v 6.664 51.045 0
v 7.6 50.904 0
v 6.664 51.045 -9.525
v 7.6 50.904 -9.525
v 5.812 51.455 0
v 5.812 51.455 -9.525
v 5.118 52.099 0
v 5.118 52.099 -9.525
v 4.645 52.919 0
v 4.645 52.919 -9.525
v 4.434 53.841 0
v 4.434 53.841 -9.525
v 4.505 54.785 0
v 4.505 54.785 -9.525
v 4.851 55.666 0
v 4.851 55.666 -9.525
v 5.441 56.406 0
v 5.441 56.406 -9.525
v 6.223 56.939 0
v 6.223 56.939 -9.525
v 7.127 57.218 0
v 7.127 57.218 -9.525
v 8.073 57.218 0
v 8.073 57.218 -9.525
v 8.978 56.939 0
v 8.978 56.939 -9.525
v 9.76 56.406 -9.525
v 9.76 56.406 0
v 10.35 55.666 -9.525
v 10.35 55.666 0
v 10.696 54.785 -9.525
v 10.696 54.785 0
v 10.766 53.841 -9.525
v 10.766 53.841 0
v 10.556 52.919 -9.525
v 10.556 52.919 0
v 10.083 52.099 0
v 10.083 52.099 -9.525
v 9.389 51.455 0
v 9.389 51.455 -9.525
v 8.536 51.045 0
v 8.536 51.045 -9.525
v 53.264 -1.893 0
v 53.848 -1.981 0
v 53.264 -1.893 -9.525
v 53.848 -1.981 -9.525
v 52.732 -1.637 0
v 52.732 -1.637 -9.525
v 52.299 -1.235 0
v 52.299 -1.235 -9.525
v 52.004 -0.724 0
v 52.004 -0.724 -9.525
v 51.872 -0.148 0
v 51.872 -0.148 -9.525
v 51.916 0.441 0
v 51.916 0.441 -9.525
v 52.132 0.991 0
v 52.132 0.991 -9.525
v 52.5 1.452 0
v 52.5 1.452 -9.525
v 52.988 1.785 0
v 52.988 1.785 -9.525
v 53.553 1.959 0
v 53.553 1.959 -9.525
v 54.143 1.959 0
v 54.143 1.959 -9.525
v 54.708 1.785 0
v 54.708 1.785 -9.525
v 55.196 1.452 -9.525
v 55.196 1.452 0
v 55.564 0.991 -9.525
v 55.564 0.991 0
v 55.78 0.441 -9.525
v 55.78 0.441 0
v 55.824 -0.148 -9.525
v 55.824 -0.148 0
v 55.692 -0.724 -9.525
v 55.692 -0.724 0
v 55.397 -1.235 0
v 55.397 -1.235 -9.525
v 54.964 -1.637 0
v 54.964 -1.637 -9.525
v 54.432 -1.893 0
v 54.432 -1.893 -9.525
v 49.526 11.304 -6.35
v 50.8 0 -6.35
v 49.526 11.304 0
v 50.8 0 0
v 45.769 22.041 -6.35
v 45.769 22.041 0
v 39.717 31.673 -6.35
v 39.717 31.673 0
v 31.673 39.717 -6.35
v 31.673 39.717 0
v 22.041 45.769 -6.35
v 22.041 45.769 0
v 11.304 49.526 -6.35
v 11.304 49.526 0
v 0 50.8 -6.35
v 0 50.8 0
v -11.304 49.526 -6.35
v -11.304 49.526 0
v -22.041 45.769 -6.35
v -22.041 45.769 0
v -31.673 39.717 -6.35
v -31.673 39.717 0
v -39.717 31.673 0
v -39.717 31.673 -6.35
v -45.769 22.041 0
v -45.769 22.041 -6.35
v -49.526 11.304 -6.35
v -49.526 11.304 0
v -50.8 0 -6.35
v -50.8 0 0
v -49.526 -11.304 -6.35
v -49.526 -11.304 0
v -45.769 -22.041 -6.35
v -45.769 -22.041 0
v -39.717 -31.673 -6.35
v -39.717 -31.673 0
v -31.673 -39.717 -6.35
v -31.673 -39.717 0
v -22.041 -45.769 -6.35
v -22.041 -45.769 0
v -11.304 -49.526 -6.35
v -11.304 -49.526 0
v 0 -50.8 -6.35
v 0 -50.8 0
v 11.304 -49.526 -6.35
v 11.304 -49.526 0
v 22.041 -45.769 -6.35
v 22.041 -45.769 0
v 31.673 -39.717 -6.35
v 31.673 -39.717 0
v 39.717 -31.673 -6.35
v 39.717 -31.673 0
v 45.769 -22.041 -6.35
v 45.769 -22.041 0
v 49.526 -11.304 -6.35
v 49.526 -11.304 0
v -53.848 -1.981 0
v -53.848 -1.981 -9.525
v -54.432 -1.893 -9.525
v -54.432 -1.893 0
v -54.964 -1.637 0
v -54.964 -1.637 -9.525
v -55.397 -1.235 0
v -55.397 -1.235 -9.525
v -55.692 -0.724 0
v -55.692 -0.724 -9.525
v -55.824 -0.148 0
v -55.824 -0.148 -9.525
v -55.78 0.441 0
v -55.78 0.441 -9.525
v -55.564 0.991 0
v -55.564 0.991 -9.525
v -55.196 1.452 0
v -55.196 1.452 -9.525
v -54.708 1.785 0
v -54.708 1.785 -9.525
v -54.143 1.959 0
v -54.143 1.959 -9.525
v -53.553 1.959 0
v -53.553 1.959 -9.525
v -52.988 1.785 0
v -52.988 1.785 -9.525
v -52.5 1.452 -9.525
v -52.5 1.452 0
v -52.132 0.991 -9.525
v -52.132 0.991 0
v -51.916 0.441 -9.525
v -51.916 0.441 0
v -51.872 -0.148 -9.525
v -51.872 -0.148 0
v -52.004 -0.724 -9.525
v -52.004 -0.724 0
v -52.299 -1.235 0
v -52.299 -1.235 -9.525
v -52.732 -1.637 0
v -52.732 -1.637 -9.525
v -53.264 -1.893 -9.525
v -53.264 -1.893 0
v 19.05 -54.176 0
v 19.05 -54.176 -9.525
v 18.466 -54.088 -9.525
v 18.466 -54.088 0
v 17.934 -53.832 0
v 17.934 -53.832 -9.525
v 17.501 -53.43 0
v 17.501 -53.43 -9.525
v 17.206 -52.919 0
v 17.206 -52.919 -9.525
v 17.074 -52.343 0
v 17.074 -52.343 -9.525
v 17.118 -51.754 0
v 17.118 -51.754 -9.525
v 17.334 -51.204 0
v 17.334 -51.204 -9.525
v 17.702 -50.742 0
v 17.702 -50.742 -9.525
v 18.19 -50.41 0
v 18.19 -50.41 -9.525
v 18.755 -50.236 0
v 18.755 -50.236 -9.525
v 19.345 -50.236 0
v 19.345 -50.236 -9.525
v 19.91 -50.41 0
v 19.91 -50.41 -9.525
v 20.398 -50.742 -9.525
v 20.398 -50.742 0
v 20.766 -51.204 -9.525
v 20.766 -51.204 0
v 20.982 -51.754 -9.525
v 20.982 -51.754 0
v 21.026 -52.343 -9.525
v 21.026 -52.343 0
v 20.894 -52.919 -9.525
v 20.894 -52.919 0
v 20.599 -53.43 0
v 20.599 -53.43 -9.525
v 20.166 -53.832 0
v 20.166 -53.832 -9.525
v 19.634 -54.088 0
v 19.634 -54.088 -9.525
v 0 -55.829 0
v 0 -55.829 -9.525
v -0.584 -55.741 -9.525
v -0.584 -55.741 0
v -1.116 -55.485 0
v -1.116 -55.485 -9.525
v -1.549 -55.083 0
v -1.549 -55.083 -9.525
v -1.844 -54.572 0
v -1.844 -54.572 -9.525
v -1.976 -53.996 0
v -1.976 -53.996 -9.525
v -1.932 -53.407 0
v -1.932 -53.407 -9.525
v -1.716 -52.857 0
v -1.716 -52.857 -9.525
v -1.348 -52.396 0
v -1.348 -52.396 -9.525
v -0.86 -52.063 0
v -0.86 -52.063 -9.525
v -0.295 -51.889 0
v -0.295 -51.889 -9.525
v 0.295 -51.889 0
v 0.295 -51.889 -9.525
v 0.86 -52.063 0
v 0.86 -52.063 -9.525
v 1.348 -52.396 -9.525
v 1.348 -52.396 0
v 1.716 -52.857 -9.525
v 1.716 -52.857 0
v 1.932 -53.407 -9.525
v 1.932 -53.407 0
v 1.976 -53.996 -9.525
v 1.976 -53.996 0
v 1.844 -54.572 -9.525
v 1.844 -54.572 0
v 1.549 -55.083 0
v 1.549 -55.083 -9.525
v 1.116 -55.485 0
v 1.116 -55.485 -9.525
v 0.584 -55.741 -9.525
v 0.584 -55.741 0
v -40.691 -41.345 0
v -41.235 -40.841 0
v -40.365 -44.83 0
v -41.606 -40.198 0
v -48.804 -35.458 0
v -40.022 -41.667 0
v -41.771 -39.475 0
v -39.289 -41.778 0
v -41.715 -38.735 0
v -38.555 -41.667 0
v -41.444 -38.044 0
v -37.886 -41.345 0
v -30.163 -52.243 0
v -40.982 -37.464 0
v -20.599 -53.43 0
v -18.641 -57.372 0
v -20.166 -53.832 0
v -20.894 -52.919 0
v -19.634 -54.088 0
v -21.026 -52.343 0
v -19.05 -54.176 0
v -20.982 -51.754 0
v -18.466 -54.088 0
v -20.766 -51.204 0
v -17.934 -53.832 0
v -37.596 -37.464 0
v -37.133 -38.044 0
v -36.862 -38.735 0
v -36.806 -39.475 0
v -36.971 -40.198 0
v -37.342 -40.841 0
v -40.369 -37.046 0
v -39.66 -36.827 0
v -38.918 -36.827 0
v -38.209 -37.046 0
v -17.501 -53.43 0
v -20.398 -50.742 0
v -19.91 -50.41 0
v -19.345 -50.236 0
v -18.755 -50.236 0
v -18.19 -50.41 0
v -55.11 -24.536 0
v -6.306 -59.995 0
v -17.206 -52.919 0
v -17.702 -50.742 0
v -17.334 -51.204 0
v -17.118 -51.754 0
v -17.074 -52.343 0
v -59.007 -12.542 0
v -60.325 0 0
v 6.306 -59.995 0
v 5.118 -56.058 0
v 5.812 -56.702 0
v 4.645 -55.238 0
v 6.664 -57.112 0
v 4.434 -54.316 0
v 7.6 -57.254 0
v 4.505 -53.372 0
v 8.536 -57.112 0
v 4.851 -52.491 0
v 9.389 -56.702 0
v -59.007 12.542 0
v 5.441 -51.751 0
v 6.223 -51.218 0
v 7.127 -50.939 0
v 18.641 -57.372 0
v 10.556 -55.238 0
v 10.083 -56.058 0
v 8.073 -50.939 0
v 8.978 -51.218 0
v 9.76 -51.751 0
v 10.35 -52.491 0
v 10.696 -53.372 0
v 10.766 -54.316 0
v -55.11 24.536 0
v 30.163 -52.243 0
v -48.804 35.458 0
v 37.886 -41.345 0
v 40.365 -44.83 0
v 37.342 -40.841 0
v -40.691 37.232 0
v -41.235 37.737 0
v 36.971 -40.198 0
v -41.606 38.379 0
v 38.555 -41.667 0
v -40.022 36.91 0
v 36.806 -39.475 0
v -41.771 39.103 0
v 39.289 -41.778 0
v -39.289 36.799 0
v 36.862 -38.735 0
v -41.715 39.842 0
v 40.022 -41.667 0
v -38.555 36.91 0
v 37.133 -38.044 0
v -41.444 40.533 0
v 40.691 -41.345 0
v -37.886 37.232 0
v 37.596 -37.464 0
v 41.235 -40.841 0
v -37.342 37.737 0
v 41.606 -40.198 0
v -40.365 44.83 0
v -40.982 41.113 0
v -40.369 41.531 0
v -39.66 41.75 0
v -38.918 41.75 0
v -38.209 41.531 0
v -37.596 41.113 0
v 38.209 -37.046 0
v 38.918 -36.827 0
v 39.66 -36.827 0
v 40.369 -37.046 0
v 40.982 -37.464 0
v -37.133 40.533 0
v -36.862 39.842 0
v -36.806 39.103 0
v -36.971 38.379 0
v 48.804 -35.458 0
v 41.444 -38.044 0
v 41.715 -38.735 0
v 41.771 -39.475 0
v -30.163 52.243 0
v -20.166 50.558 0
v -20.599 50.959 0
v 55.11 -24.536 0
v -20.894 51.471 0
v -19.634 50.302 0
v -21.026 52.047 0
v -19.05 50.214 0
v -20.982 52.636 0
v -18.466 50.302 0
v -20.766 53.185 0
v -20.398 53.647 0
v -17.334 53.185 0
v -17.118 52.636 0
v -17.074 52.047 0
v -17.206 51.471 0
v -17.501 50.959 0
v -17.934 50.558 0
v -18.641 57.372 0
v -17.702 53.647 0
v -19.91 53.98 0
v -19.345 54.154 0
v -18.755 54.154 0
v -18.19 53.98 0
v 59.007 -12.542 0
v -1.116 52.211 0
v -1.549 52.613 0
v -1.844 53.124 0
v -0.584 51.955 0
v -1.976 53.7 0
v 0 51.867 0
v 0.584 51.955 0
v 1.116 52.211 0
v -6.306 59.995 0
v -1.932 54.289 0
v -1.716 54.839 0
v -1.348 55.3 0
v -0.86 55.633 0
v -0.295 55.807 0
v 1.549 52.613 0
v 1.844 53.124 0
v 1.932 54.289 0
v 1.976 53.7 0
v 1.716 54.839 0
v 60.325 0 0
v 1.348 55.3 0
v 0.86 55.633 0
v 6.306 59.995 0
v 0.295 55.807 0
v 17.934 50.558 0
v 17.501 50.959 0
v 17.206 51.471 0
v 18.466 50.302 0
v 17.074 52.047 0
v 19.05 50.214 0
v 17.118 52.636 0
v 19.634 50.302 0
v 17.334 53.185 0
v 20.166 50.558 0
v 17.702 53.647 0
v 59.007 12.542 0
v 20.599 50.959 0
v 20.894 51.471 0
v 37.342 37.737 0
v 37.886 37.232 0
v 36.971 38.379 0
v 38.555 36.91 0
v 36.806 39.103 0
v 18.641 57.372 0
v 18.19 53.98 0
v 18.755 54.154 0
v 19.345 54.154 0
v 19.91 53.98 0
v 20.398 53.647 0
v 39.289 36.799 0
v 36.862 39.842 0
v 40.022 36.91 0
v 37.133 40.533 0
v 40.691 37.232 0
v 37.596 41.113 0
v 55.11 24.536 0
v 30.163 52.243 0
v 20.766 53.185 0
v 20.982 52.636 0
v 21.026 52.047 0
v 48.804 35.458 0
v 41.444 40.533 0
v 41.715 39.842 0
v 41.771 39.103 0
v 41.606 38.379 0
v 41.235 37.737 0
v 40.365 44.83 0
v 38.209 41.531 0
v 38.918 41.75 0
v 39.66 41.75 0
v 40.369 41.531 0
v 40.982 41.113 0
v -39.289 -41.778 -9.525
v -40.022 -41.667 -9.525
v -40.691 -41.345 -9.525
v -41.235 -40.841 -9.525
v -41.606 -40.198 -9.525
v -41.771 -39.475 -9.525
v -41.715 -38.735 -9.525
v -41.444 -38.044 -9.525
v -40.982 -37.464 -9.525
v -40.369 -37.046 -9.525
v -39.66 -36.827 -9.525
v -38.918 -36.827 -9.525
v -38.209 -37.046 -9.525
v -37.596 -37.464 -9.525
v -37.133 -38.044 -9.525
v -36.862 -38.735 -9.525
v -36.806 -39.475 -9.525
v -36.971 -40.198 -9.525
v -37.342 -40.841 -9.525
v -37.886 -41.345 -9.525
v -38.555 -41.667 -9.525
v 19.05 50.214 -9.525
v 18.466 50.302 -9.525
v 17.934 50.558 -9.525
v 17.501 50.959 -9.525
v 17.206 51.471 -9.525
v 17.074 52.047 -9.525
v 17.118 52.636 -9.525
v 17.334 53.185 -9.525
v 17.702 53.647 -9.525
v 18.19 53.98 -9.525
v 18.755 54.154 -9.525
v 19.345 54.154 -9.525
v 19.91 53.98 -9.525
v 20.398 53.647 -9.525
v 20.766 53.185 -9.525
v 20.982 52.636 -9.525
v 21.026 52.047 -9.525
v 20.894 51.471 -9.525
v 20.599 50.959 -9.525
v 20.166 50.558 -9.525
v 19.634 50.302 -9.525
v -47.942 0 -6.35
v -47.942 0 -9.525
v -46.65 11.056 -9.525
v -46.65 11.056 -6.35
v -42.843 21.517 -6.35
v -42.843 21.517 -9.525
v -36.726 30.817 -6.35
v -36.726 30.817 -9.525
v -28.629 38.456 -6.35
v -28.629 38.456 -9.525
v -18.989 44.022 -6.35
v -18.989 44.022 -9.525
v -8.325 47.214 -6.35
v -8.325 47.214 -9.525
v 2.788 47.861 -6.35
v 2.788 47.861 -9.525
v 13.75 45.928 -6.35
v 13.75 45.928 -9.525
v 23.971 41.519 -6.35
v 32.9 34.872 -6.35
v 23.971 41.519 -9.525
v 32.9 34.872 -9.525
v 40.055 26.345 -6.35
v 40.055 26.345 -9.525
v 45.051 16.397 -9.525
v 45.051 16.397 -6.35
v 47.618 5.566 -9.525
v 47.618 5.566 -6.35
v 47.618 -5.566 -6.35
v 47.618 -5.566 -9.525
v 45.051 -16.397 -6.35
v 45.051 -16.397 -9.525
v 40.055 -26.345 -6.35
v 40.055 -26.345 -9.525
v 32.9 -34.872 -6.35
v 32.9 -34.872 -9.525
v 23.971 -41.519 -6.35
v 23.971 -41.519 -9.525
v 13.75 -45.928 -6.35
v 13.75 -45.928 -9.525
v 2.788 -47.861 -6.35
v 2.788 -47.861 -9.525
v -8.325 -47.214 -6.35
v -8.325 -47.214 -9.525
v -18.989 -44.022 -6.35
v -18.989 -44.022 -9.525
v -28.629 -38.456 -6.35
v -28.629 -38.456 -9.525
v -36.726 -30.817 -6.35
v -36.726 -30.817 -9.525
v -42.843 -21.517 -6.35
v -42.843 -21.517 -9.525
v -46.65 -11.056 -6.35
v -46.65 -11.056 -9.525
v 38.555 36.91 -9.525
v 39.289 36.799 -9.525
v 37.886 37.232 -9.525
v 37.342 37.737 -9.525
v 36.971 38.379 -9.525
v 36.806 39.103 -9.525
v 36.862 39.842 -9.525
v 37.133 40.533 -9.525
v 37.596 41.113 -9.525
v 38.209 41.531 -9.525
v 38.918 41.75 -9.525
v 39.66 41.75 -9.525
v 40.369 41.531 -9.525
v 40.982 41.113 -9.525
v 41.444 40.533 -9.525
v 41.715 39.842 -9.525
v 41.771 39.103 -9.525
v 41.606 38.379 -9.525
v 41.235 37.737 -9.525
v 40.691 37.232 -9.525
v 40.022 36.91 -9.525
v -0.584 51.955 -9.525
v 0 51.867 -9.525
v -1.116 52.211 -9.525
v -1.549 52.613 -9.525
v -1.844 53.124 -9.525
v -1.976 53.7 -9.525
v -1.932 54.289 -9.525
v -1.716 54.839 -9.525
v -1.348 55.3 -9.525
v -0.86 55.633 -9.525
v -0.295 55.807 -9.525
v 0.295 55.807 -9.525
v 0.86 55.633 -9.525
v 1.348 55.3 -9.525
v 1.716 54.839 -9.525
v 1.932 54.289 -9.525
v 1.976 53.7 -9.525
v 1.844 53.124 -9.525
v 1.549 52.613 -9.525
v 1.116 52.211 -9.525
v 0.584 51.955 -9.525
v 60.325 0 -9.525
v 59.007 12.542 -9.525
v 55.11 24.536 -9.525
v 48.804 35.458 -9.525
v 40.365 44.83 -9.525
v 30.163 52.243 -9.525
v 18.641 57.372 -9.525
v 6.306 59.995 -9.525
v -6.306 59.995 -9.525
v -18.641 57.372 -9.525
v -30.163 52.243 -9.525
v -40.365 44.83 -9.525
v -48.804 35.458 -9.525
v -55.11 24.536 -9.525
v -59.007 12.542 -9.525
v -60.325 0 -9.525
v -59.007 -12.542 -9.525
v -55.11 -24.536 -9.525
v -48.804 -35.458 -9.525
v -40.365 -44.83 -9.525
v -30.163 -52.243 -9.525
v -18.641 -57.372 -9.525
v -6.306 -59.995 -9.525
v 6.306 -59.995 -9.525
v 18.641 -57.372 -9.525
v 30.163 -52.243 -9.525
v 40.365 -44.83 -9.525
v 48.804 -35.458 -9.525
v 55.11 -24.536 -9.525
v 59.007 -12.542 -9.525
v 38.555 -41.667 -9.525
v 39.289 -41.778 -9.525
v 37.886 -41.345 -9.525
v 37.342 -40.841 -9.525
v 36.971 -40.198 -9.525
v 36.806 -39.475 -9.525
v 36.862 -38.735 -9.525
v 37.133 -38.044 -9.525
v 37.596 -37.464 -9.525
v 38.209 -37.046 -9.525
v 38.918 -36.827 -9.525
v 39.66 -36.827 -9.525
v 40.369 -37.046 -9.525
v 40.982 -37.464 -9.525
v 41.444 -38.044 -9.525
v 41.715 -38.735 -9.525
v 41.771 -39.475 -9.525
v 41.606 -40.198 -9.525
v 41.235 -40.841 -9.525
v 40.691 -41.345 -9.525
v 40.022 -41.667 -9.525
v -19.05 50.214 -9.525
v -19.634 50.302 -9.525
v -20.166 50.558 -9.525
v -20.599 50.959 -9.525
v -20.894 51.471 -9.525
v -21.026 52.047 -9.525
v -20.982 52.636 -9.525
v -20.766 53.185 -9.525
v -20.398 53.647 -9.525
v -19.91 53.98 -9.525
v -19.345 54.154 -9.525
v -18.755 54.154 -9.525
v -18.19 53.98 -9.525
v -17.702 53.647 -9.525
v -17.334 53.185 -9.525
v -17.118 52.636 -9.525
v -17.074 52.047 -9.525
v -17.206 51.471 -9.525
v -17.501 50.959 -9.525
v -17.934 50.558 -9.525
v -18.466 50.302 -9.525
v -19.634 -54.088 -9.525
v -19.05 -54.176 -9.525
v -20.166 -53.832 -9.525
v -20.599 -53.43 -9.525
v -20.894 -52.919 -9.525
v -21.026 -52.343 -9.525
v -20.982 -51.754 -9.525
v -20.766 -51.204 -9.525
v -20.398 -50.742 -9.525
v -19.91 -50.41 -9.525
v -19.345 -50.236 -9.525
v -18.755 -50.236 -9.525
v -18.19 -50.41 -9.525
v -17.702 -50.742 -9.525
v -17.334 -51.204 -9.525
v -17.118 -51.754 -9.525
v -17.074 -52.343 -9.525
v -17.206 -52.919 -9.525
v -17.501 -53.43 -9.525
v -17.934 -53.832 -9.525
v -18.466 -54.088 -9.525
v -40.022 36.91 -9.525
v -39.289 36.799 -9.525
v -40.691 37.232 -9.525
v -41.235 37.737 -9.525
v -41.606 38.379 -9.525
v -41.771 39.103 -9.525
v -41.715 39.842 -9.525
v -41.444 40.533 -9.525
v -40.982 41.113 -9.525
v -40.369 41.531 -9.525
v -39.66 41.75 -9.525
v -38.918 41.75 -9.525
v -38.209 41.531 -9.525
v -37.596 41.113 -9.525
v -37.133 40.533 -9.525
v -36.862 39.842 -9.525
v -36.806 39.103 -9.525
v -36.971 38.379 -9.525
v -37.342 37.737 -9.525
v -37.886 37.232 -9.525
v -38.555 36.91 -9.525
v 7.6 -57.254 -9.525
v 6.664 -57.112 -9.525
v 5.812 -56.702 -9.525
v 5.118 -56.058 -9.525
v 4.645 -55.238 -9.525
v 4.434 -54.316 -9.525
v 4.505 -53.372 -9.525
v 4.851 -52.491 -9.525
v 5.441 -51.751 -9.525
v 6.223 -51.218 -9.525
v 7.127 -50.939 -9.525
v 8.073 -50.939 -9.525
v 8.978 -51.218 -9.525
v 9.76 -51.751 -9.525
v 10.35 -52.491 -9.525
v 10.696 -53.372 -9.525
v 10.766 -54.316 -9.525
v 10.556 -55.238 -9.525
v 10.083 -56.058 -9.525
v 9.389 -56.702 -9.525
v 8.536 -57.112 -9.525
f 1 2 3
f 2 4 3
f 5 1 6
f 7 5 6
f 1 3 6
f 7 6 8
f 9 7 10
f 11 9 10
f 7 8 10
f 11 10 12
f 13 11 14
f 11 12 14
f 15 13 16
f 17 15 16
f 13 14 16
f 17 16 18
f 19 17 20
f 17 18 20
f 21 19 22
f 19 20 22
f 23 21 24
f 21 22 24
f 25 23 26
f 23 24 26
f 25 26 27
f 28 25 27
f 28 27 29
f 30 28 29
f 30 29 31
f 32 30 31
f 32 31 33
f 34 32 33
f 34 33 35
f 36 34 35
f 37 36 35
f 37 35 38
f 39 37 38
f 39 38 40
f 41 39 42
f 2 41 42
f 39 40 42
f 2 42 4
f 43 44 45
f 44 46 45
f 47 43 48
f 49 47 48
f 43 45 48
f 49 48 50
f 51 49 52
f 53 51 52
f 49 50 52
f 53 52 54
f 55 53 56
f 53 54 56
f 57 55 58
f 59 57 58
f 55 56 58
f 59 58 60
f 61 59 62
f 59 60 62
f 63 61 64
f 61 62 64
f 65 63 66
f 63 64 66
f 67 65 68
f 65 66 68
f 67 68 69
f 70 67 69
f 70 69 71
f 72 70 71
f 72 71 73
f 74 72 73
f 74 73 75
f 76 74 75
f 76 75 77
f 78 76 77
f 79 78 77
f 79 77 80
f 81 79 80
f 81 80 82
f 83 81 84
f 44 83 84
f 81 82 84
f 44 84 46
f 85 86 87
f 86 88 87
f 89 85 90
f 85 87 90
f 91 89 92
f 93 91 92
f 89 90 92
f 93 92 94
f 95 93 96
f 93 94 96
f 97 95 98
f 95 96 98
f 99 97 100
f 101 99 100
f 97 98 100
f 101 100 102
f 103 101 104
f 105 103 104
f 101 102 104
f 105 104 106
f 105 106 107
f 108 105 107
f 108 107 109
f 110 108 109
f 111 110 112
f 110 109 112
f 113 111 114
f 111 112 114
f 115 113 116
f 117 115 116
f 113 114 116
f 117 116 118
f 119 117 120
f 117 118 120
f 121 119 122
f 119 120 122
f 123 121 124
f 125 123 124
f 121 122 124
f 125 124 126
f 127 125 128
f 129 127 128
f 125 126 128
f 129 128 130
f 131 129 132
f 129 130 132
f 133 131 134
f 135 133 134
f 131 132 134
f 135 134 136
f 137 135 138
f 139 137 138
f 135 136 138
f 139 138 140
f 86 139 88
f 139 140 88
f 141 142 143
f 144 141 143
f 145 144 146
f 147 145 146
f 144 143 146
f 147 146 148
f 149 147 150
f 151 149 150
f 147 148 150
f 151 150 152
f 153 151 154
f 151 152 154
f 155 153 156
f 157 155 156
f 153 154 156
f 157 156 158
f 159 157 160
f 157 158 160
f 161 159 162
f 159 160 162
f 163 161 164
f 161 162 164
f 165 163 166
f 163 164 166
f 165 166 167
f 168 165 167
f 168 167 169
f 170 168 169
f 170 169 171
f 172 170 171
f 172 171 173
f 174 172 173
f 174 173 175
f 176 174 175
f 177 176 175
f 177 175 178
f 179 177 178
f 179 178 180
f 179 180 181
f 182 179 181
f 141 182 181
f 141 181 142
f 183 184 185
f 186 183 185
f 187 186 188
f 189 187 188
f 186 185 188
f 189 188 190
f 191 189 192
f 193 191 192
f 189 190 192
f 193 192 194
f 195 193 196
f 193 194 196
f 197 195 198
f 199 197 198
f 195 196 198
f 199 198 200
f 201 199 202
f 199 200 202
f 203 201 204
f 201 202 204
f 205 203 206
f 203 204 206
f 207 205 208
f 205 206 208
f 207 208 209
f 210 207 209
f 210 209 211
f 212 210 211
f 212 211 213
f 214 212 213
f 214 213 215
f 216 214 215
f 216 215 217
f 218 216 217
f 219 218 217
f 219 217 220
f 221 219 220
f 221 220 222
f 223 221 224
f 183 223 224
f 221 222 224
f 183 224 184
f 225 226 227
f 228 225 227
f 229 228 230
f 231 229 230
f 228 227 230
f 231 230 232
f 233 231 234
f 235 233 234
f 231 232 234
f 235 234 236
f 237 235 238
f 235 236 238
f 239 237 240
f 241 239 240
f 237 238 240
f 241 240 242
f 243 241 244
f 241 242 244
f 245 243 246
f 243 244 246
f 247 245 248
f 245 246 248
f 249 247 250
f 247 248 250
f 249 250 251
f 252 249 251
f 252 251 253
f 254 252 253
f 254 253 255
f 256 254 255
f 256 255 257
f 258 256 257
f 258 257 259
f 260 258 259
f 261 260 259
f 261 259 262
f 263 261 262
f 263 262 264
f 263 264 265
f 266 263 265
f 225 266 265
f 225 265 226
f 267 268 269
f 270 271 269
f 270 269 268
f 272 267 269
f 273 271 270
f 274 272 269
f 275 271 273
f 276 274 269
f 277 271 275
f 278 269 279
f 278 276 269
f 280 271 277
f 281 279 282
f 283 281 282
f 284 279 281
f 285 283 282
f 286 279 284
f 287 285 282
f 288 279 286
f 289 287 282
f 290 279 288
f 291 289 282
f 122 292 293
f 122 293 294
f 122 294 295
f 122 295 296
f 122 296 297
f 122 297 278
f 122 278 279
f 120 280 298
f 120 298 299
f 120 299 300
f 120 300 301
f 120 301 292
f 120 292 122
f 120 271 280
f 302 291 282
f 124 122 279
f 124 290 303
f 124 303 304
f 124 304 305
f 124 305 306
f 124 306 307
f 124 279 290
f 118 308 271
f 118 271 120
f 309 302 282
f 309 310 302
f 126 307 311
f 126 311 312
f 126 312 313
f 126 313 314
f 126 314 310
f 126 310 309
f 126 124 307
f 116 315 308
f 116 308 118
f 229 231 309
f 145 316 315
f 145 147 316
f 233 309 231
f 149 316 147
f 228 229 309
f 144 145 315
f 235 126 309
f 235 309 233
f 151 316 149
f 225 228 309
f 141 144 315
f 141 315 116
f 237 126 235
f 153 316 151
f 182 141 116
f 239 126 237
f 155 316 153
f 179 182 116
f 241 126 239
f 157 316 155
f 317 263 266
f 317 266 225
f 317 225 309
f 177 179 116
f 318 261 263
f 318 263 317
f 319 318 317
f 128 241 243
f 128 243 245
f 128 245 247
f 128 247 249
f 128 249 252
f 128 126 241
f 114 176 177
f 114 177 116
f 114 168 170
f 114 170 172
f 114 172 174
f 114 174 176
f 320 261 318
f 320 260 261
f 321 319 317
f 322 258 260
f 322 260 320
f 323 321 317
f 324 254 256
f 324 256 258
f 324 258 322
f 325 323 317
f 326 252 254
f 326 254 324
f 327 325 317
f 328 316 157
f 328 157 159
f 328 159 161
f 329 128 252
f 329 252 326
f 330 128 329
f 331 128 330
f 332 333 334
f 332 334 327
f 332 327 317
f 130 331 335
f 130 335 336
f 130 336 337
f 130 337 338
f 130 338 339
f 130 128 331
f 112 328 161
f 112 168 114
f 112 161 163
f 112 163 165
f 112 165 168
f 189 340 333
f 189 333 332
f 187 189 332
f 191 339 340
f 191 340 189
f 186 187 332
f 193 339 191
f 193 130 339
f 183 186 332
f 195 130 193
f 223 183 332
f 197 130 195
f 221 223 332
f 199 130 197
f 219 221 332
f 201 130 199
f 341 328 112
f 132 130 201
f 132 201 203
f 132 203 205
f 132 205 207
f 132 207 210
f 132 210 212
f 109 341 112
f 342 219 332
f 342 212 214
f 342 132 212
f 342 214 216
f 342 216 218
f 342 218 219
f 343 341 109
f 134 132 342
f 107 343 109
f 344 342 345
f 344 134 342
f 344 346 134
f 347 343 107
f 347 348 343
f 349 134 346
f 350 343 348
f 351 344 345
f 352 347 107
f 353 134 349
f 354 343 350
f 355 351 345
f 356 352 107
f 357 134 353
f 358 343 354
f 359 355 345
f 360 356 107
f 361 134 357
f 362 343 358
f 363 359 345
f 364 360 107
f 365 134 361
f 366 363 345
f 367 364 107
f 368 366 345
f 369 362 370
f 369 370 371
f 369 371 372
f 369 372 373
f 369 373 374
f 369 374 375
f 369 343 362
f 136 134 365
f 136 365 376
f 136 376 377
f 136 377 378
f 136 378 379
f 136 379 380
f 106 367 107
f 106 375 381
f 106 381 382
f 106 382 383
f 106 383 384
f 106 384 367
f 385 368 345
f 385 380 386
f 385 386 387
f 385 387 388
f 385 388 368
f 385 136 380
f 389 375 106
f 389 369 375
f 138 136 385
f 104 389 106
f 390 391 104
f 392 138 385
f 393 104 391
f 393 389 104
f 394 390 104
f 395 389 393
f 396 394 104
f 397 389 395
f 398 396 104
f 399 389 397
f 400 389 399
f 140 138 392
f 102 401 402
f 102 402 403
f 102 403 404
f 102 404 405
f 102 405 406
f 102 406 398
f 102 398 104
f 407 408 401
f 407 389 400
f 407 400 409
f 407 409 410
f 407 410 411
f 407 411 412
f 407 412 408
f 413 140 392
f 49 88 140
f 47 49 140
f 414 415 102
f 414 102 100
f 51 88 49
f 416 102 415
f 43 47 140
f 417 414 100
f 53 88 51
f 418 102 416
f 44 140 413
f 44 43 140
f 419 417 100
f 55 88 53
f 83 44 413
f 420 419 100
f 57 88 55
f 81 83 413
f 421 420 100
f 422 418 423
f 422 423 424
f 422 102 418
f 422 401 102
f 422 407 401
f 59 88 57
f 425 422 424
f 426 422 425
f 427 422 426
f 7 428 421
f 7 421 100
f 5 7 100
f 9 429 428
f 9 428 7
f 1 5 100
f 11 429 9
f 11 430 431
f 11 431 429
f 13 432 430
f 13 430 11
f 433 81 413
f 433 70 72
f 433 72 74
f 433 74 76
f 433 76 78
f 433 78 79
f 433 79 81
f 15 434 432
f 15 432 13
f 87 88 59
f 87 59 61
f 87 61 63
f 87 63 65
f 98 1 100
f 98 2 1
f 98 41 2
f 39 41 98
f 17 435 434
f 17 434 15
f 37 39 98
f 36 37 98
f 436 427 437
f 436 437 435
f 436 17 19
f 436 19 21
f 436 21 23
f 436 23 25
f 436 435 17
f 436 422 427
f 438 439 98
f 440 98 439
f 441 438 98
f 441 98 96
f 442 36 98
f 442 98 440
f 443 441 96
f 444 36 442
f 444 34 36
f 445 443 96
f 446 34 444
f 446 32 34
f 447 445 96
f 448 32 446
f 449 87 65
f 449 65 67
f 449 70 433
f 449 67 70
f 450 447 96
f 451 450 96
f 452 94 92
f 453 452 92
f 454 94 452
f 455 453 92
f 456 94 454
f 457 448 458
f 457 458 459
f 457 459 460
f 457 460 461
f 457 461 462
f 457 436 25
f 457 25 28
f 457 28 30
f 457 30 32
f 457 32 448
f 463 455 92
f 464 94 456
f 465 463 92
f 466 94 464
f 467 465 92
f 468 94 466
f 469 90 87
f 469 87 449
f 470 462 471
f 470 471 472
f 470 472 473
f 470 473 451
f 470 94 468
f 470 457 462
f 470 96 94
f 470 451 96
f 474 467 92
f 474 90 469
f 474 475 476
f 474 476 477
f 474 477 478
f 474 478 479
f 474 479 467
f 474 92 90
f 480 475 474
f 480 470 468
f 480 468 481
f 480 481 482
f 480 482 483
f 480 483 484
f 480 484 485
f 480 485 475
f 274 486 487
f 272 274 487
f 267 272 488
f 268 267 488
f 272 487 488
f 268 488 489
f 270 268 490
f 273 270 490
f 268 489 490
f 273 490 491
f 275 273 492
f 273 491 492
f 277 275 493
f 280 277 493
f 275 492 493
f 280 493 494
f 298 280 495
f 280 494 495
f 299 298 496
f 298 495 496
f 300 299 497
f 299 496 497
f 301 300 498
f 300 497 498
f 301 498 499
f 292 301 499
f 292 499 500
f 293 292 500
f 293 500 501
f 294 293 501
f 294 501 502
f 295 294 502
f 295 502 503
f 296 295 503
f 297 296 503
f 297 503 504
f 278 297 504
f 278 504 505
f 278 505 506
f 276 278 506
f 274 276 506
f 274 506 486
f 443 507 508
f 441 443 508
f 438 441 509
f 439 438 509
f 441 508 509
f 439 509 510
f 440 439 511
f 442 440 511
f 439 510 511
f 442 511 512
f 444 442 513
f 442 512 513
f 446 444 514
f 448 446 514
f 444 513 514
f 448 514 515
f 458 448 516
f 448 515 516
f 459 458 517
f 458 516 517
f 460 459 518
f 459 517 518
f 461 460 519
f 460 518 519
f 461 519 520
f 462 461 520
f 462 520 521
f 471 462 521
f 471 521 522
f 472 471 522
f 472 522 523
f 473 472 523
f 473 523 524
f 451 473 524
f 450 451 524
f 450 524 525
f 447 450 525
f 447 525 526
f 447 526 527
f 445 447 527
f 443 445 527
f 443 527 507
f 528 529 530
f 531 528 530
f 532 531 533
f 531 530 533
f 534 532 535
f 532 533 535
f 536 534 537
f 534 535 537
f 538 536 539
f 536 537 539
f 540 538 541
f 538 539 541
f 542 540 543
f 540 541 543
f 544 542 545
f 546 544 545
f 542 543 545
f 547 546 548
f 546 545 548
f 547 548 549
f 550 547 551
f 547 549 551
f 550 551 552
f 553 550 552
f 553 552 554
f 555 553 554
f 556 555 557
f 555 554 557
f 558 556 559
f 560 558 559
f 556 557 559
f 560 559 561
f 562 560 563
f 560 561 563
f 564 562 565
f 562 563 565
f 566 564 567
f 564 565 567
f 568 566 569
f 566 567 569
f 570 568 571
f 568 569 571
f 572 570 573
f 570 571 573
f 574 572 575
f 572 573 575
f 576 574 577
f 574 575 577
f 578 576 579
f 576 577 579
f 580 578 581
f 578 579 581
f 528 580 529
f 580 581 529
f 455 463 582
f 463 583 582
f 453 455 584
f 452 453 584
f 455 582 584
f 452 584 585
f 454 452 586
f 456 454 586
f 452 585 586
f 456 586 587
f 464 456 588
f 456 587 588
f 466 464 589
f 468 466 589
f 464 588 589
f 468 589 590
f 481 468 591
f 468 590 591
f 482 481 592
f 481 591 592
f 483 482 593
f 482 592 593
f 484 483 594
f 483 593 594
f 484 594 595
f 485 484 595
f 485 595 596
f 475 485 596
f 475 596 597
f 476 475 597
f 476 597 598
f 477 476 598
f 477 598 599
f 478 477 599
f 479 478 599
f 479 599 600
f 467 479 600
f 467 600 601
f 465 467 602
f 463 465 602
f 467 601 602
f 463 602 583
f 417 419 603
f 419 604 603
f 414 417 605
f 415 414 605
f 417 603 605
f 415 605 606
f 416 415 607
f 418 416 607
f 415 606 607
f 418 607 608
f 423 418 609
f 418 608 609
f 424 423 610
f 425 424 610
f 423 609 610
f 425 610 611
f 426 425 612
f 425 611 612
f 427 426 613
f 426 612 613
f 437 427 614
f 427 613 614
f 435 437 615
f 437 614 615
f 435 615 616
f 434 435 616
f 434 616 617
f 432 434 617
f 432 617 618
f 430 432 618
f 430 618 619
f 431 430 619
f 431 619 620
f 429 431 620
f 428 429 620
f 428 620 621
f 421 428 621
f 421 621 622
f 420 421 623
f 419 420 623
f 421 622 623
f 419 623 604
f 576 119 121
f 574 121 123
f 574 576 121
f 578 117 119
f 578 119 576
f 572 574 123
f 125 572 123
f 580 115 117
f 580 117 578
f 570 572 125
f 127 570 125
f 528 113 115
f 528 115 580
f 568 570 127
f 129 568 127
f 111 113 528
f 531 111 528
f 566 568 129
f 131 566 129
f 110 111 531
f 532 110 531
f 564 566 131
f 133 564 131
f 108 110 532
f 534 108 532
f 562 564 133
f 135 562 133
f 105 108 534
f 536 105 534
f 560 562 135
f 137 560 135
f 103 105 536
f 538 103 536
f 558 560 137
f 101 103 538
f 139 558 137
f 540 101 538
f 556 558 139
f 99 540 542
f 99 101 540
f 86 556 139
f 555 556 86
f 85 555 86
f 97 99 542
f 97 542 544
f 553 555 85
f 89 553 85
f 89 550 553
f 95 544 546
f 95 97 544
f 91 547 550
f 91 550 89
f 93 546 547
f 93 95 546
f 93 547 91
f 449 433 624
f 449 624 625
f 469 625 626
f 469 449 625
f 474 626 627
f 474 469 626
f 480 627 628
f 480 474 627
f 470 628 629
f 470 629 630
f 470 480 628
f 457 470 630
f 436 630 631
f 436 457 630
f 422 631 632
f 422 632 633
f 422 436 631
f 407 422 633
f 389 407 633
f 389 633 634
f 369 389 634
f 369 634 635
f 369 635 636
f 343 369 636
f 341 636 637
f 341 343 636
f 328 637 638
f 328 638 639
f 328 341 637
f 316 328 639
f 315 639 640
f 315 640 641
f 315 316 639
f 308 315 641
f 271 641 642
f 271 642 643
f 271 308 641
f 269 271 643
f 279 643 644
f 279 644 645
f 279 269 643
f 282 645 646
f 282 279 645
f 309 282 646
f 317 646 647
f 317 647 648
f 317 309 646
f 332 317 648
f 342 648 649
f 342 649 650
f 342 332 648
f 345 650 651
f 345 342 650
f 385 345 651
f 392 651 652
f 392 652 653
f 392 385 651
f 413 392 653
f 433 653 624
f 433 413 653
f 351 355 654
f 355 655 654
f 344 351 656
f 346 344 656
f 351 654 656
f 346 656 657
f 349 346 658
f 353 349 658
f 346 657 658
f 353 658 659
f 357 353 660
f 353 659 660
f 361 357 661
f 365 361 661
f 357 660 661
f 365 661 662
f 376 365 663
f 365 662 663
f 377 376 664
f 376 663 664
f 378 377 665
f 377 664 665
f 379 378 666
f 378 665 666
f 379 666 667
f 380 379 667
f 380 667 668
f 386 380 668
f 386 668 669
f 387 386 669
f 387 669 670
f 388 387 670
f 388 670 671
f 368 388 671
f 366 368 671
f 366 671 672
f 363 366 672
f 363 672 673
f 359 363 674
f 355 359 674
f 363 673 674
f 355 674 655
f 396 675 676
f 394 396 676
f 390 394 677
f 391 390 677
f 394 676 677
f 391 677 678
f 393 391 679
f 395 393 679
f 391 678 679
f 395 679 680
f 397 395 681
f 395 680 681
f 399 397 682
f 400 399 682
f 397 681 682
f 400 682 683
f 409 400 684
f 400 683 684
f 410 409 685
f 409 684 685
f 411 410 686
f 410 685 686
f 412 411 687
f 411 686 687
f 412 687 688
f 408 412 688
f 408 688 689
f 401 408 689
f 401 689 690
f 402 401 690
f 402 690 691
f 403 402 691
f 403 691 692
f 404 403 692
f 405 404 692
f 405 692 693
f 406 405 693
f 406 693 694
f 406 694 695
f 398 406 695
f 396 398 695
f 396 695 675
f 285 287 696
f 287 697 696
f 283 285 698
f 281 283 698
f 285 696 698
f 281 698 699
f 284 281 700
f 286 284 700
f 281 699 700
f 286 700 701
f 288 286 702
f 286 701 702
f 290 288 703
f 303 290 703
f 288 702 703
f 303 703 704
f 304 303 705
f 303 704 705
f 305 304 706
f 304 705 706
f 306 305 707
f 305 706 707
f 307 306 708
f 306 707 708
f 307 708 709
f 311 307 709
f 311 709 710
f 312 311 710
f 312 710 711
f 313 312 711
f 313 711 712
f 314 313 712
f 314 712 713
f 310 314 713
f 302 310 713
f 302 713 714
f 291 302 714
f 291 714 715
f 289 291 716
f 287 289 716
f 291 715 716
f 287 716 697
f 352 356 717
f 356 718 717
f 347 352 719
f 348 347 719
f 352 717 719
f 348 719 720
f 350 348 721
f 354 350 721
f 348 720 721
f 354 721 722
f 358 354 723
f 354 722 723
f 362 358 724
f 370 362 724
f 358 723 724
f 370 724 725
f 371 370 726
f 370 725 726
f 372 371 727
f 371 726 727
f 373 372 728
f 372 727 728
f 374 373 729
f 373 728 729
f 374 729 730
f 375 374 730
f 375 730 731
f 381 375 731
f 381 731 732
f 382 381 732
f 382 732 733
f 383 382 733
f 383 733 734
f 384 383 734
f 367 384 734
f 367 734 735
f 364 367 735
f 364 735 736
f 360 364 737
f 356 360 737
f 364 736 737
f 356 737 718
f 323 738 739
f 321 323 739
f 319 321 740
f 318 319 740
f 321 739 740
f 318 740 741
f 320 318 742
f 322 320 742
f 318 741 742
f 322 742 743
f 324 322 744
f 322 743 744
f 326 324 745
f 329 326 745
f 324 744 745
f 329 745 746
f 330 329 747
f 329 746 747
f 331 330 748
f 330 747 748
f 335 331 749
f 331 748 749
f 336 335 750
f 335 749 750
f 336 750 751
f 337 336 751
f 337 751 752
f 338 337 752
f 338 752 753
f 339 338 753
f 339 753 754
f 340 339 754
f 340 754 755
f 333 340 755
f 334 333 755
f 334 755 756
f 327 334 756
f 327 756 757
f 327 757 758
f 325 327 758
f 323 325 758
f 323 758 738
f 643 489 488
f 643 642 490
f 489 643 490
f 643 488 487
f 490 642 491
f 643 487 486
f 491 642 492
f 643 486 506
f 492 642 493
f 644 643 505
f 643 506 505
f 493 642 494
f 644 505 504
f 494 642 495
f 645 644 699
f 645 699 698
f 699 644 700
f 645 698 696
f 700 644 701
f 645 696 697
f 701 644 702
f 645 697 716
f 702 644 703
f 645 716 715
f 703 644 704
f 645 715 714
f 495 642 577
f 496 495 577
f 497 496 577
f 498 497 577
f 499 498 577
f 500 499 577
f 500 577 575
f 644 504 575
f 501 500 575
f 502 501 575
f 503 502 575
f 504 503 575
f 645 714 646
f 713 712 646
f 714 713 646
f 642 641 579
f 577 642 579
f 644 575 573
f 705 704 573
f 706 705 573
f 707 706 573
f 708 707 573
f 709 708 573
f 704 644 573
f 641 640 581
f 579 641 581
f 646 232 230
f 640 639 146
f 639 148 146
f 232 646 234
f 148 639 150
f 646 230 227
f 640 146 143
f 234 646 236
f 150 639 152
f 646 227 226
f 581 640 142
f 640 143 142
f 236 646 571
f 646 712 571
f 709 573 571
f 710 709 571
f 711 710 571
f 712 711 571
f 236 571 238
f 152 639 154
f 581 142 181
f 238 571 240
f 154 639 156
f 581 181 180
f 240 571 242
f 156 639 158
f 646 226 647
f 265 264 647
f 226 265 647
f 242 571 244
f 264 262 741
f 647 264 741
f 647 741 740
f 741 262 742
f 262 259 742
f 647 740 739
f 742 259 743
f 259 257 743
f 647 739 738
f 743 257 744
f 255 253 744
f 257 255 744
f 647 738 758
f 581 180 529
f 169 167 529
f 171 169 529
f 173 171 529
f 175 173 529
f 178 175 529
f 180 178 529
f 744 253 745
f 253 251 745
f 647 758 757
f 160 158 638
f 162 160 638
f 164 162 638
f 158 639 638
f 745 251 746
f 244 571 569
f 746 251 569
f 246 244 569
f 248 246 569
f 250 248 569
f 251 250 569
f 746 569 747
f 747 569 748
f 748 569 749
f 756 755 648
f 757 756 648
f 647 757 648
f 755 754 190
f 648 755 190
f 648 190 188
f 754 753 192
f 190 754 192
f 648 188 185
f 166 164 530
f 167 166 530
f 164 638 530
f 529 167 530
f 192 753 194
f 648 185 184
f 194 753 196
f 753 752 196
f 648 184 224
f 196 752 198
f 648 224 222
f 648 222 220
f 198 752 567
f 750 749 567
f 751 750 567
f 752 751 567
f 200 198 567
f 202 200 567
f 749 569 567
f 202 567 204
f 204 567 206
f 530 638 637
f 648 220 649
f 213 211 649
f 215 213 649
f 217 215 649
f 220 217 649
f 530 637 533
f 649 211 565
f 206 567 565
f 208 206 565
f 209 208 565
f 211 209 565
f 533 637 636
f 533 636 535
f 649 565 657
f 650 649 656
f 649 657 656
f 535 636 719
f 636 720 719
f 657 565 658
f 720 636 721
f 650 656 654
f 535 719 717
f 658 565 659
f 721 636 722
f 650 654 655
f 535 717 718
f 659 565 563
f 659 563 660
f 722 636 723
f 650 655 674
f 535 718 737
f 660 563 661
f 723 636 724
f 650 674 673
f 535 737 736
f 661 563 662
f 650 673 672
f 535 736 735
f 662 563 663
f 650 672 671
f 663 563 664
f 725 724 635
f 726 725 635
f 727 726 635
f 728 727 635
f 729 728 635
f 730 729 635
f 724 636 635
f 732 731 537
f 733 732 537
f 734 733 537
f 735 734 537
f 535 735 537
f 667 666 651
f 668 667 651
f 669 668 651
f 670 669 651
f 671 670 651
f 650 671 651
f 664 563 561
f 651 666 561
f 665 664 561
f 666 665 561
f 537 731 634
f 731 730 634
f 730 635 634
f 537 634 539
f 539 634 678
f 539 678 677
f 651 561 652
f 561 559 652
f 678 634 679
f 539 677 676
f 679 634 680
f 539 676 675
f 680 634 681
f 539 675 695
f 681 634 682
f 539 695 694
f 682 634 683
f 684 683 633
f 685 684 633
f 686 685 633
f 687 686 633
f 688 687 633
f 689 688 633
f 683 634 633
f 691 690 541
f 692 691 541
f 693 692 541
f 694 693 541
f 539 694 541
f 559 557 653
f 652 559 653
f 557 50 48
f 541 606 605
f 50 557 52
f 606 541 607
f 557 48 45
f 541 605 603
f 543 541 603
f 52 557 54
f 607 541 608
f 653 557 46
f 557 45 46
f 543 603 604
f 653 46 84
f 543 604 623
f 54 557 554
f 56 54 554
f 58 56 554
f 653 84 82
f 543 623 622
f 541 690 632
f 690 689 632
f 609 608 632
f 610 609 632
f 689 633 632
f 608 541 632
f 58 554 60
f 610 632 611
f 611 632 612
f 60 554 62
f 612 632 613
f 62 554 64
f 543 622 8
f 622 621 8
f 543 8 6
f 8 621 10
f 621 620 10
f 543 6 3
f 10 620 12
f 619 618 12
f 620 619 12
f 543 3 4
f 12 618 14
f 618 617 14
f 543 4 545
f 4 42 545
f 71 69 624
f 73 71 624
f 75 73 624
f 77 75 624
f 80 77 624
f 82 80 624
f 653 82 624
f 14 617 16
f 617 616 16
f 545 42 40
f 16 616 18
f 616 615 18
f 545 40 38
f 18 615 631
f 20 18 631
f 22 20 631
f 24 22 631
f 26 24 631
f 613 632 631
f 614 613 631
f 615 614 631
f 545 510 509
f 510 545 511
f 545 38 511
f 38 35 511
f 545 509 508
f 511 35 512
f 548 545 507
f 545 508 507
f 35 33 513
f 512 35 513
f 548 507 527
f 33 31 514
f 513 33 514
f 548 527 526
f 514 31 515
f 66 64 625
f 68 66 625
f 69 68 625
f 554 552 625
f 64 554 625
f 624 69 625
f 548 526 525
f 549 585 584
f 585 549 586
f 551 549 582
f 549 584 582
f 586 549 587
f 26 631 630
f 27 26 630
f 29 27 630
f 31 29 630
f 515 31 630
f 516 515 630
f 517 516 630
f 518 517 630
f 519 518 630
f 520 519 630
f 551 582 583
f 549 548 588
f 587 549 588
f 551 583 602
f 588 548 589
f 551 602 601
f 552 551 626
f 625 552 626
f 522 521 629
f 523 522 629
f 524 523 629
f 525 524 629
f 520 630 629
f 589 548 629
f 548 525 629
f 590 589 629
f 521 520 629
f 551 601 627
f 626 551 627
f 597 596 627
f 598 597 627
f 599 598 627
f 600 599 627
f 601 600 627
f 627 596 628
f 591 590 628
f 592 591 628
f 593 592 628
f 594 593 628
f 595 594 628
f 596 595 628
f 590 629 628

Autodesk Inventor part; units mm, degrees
ref_plane "YZ Plane" through (0, 0, 0) normal (1, 0, 0) x (0, 1, 0)
ref_plane "XZ Plane" through (0, 0, 0) normal (0, 1, 0) x (-1, 0, 0)
ref_plane "XY Plane" through (0, 0, 0) normal (0, 0, 1) x (1, 0, 0)
sketch "Sketch1" plane through (0, 0, 0) normal (0, 0, 1) x (1, 0, 0)
  circle A0 centre (0, 0) radius 60.325
  circle A1 centre (0, 0) radius 47.625
  dimension "d0" = 120.65
  dimension "d1" = 12.7
extrude "Extrusion1" add sketch "Sketch1" against normal blind 9.525
sketch "Sketch2" plane through (0, 0, 0) normal (0, 0, 1) x (1, 0, 0)
  circle A0 centre (0, 0) radius 50.8
  circle A1 centre (0, 0) radius 47.625 projected
  dimension "d4" = 101.6
extrude "Extrusion2" cut sketch "Sketch2" against normal blind 6.35 contours A0 | A1
sketch "Sketch3" plane through (0, 0, 0) normal (0, 0, 1) x (1, 0, 0)
  circle A0 centre (0, 0) radius 53.848 construction
  circle A1 centre (0, 0) radius 60.325 projected
  point P0 (0, 53.848)
  point P1 (-53.848, 0)
  point P2 (0, -53.848)
  point P3 (53.848, 0)
  dimension "d7" = 53.848
  dimension "d10" = 360
hole "Hole1" at (0, 53.848, 0) at (-53.848, 0, 0) at (0, -53.848, 0) at (53.848, 0, 0) direction (0, 0, -1) diameter 3.9624 end through all thread size "10-32 UNF" class "2B" standard "ANSI Unified Screw Threads"
sketch "Sketch4" plane through (0, 0, -9.525) normal (0, 0, -1) x (-1, 0, 0)
  circle A0 centre (0, 0) radius 47.9425
  circle A1 centre (0, 0) radius 47.625 projected
  dimension "d19" = 95.885
extrude "Extrusion3" cut sketch "Sketch4" against normal blind 6.35
sketch "Sketch5" plane through (0, 0, 0) normal (0, 0, 1) x (1, 0, 0)
  circle A0 centre (0, 0) radius 55.5625 construction
  line L0 (0, 0) -> (0, 55.5625) construction
  circle A1 centre (0, 0) radius 60.325 construction
  line L1 (-60.325, 0) -> (60.325, 0) construction
  line L2 (-19.05, -52.1947) -> (-19.05, 52.1947) construction
  line L3 (19.05, -52.1947) -> (19.05, 52.1947) construction
  dimension "d22" = 111.125
  dimension "d25" = 19.05
  dimension "d26" = 19.05
  dimension "d47" = 104.394
hole "Hole2" at (-19.05, 52.1947, 0) at (19.05, 52.1947, 0) at (-19.05, -52.1947, 0) at (19.05, -52.1947, 0) direction (0, 0, -1) diameter 3.9624 end through all thread size "10-32 UNF" class "2B" standard "ANSI Unified Screw Threads"
sketch "Sketch6" plane through (0, 0, 0) normal (0, 0, 1) x (1, 0, 0)
  circle A0 centre (0, 0) radius 55.5625 construction
  line L0 (0, 0) -> (-39.2886, 39.2886) construction
  line L1 (0, 0) -> (-60.7712, 0) construction
  point P0 (-39.2886, -39.2886)
  point P1 (39.2886, -39.2886)
  point P2 (39.2886, 39.2886)
  dimension "d34" = 111.125
  dimension "d35" = 45
  dimension "d38" = 360
hole "Hole3" at (-39.2886, 39.2886, 0) at (-39.2886, -39.2886, 0) at (39.2886, -39.2886, 0) at (39.2886, 39.2886, 0) direction (0, 0, -1) diameter 4.9784 end through all thread size "1/4-20 UNC" class "2B" standard "ANSI Unified Screw Threads"
sketch "Sketch7" plane through (0, 0, 0) normal (0, 0, 1) x (1, 0, 0)
  circle A0 centre (0, 0) radius 54.61 construction
  line L0 (0, 0) -> (0, 54.61) construction
  line L1 (0, 0) -> (7.6002, 54.0785) construction
  circle A1 centre (0, 0) radius 60.325 construction
  line L2 (-60.325, 0) -> (60.325, 0) construction
  circle A2 centre (39.2886, -39.2886) radius 2.4892 projected
  circle A3 centre (-39.2886, 39.2886) radius 2.4892 projected
  circle A4 centre (-39.2886, -39.2886) radius 2.4892 projected
  circle A5 centre (39.2886, 39.2886) radius 2.4892 projected
  circle A6 centre (-19.05, -52.1947) radius 1.9812 projected
  circle A7 centre (-19.05, 52.1947) radius 1.9812 projected
  circle A8 centre (19.05, 52.1947) radius 1.9812 projected
  circle A9 centre (19.05, -52.1947) radius 1.9812 projected
  circle A10 centre (0, -53.848) radius 1.9812 projected
  circle A11 centre (0, 53.848) radius 1.9812 projected
  circle A12 centre (-53.848, 0) radius 1.9812 projected
  circle A13 centre (53.848, 0) radius 1.9812 projected
  circle A14 centre (0, 0) radius 50.8 projected
  circle A15 centre (0, 0) radius 60.325 projected
  point P0 (7.6002, -54.0785)
  dimension "d49" = 109.22
  dimension "d50" = 8
hole "Hole4" at (7.6002, 54.0785, 0) at (7.6002, -54.0785, 0) direction (0, 0, -1) diameter 6.35 end through all
properties part number "LS-001" material "Aluminum 6061"
